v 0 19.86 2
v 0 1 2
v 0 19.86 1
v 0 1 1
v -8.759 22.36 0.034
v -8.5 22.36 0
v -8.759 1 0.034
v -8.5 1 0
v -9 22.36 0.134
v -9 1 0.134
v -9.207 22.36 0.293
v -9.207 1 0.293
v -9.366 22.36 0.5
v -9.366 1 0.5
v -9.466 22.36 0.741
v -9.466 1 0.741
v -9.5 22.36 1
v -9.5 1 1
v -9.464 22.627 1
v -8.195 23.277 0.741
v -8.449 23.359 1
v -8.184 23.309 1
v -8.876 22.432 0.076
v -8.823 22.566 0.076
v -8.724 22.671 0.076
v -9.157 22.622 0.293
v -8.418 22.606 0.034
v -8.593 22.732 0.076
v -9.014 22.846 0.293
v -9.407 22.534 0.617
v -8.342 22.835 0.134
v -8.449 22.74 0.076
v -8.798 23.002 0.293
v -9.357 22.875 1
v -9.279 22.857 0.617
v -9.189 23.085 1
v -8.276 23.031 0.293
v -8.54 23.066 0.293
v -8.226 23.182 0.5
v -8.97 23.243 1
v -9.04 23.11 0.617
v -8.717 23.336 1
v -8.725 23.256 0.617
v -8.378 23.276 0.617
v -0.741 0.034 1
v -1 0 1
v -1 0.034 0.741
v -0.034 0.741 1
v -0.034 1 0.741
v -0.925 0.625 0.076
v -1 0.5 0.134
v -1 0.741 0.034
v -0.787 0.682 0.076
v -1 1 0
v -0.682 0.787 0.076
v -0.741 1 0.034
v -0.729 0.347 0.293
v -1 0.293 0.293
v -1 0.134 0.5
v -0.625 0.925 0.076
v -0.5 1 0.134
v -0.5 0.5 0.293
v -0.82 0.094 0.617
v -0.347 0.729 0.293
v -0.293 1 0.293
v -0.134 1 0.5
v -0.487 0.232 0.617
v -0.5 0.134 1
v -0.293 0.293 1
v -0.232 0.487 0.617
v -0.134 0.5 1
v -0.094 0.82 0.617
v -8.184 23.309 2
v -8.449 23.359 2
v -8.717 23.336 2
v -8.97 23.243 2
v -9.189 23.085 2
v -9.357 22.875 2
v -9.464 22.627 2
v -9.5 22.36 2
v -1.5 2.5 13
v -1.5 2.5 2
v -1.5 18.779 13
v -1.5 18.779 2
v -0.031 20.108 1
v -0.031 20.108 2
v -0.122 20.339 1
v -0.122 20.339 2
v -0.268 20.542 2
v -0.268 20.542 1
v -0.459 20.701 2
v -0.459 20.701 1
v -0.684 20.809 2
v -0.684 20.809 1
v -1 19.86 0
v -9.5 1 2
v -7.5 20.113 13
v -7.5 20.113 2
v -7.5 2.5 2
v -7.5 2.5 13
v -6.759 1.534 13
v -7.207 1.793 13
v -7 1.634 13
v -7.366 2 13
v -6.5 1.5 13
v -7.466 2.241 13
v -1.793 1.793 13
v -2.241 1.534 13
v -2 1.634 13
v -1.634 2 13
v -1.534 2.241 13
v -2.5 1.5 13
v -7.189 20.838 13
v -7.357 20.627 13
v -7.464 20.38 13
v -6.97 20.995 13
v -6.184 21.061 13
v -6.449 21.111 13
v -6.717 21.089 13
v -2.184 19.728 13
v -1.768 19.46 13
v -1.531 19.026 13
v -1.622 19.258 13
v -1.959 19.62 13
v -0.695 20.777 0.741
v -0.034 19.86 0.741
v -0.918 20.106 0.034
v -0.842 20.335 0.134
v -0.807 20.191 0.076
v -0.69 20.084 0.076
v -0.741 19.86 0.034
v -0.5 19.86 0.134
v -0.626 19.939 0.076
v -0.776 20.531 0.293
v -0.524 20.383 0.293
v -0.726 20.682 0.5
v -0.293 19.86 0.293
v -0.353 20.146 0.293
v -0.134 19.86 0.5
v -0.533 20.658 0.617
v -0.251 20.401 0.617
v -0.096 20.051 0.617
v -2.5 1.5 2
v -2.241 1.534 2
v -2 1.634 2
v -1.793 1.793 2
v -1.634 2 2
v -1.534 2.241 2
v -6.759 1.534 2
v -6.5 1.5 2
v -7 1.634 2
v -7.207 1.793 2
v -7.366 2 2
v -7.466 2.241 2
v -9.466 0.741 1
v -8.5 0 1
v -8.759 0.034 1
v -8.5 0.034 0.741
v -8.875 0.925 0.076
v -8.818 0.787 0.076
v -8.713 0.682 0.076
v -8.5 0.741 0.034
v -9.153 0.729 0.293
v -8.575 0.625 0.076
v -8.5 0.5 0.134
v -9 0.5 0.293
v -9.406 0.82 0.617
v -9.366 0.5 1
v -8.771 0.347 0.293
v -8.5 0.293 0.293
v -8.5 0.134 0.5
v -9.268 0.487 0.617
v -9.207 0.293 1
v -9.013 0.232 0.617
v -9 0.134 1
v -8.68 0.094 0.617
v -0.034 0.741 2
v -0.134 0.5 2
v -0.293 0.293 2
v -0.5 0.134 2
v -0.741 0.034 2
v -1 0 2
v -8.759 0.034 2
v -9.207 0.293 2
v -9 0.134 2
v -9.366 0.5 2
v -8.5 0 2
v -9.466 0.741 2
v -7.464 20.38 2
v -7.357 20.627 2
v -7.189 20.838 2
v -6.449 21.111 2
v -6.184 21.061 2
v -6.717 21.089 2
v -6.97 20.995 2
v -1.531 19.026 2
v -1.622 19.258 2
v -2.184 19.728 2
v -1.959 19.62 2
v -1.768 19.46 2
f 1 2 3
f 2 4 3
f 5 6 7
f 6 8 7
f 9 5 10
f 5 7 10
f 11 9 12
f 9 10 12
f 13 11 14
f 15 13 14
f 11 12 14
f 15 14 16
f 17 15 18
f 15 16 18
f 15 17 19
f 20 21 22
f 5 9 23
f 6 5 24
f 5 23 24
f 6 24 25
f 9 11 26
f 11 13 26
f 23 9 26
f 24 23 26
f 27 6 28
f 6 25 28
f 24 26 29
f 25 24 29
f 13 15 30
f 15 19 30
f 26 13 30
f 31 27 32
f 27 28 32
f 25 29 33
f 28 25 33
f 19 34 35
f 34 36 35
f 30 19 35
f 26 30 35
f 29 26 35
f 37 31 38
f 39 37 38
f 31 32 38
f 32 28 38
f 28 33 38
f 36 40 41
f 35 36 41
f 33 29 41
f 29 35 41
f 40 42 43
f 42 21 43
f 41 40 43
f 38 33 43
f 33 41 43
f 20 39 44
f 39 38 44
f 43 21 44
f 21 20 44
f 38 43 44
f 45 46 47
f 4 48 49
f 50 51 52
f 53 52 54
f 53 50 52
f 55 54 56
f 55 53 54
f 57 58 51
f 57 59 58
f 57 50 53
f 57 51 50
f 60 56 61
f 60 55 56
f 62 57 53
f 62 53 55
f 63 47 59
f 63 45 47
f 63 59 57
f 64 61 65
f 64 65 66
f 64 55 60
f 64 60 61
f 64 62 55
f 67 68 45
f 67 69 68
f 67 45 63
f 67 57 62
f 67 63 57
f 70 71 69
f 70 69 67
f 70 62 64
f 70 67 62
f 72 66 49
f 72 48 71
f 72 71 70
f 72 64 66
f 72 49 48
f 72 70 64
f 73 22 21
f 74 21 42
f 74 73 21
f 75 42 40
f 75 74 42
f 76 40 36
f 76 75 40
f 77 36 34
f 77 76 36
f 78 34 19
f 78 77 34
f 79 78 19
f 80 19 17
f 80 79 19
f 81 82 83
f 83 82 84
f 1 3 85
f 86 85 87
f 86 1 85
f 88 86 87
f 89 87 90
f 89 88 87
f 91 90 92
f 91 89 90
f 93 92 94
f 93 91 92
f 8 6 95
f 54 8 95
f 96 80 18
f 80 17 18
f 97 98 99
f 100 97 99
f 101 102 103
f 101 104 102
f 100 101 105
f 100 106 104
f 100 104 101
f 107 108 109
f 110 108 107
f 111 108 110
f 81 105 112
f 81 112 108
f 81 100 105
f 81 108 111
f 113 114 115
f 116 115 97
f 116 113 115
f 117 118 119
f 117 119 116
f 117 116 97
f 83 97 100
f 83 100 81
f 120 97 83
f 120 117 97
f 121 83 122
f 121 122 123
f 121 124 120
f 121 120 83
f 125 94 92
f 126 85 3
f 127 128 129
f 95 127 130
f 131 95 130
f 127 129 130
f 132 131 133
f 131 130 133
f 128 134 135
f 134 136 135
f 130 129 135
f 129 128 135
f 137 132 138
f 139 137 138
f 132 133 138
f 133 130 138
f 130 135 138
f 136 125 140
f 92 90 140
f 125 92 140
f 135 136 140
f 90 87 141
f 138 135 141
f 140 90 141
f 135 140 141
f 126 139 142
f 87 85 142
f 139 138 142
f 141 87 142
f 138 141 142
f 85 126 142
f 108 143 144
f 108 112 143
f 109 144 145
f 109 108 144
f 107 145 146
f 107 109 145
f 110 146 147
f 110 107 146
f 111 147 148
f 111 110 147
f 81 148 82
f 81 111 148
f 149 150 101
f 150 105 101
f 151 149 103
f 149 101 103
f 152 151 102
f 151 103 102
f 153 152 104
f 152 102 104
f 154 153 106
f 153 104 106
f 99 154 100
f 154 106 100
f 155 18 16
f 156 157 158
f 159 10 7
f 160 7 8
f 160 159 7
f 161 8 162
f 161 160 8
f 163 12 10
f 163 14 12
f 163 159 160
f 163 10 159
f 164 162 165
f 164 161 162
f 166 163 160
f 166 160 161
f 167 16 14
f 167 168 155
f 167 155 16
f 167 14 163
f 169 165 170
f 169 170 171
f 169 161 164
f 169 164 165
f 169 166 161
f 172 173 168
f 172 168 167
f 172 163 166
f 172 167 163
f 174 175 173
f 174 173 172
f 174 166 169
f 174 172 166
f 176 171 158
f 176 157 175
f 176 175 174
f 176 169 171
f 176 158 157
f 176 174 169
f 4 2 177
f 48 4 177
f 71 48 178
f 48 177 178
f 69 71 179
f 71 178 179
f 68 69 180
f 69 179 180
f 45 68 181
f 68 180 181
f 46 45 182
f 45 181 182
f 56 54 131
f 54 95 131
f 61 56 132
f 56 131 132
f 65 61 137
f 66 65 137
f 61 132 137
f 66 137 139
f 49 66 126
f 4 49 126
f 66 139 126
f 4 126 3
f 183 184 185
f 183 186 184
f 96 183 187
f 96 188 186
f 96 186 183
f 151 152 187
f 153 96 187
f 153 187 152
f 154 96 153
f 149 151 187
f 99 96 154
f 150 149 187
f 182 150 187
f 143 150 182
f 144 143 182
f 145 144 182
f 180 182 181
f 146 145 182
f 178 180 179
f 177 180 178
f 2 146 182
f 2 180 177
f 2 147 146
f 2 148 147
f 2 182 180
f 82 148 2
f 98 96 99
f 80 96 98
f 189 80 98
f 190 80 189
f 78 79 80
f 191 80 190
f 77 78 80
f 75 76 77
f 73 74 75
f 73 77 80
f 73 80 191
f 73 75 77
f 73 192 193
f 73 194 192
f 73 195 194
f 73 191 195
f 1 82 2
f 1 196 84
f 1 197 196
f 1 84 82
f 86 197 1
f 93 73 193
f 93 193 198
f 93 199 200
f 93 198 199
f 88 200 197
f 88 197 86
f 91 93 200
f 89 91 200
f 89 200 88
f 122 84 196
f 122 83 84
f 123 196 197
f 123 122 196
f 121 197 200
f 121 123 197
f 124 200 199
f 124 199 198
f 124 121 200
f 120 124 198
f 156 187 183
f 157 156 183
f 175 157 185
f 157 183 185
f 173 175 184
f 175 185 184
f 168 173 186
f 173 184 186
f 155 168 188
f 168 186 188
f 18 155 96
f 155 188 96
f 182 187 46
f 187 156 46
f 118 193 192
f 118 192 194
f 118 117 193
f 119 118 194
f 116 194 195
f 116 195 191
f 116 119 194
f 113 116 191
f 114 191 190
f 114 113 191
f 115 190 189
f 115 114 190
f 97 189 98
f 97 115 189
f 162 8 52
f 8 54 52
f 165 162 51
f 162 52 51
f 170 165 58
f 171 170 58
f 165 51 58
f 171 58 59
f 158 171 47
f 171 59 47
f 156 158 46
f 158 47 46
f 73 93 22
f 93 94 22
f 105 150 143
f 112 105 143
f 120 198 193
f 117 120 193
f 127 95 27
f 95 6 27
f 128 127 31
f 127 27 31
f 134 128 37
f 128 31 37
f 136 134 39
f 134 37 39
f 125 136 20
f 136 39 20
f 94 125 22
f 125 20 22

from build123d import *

# Parameters (mm, degrees)
F1_DEPTH = 2
F2_DEPTH = 13
F3_R     = 1


with BuildPart() as f1:
    # F0 (on Top) → F1 (new body)
    with BuildSketch(Plane.XY):
        Polygon((0, 0), (0, 20.581139), (-9.5, 23.747805), (-9.5, 0), align=None)
        Polygon((-1.5, 1.5), (-7.5, 1.5), (-7.5, 21.5), (-1.5, 19.5), align=None, mode=Mode.SUBTRACT)
        Polygon((-7.5, 21.5), (-7.5, 1.5), (-1.5, 1.5), (-1.5, 19.5), align=None)
    extrude(amount=F1_DEPTH)

    # F0 (on Top) → F2 (join)
    with BuildSketch(Plane.XY):
        Polygon((-7.5, 21.5), (-7.5, 1.5), (-1.5, 1.5), (-1.5, 19.5), align=None)
    extrude(amount=F2_DEPTH)

    # F3
    f3_edges = [f1.edges().sort_by_distance(p)[0] for p in [
        (-7.5, 21.5, 7.5),
        (-9.5, 23.747805, 1),
        (0, 20.581139, 1),
        (-1.5, 19.5, 7.5),
        (0, 0, 1),
        (-1.5, 1.5, 7.5),
        (-9.5, 0, 1),
        (-7.5, 1.5, 7.5),
        (-9.5, 11.873903, 0),
        (-4.75, 0, 0),
        (-4.75, 22.164472, 0),
        (0, 10.290569, 0),
    ]]
    fillet(f3_edges, radius=F3_R)


solid = f1.part
